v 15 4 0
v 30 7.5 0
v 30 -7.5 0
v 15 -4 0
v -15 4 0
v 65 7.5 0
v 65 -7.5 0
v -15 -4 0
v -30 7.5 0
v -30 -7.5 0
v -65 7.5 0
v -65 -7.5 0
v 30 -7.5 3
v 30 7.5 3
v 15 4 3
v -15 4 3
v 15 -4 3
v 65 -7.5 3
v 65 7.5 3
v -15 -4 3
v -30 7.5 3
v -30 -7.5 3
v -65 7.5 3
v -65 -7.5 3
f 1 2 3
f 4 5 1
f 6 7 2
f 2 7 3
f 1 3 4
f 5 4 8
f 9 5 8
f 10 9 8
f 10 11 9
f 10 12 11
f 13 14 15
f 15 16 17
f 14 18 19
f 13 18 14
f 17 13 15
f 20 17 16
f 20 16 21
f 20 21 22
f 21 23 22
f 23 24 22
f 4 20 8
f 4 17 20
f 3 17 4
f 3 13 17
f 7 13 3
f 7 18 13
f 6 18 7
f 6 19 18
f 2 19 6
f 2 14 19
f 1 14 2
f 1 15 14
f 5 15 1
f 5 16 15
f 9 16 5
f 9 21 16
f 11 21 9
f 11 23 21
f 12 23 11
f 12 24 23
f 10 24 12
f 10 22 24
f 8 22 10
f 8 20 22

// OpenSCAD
// Flat tensile test specimen (dog bone) for printed plastic
// Lies flat on the bed (z = 0), symmetric about the origin in X and Y.

// ---------------- Parameters ----------------
thickness      = 3;    // specimen thickness (Z)
total_length   = 130;  // overall length along X (check value)
gauge_width    = 8;    // gauge section width (Y)
gauge_length   = 30;   // gauge section length (X)
grip_width     = 15;   // grip section width (Y)
grip_length    = 35;   // grip section length (X), each end
trans_length   = 15;   // transition length (X), each side, linear taper

// ---------------- Derived values ----------------
x_gauge = gauge_length / 2;            // end of gauge section
x_trans = x_gauge + trans_length;      // end of transition / start of grip
x_end   = x_trans + grip_length;       // specimen end (= total_length/2)
hg = gauge_width / 2;                  // half gauge width
hw = grip_width / 2;                   // half grip width

// Sanity check on overall length
assert(abs(2 * x_end - total_length) < 1e-6,
       "Section lengths do not sum to total_length");

// ---------------- Outline (top view) ----------------
outline = [
    [-x_end,   -hw], [-x_trans, -hw], [-x_gauge, -hg],
    [ x_gauge, -hg], [ x_trans, -hw], [ x_end,   -hw],
    [ x_end,    hw], [ x_trans,  hw], [ x_gauge,  hg],
    [-x_gauge,  hg], [-x_trans,  hw], [-x_end,    hw]
];

// ---------------- Model ----------------
linear_extrude(height = thickness)
    polygon(points = outline);
